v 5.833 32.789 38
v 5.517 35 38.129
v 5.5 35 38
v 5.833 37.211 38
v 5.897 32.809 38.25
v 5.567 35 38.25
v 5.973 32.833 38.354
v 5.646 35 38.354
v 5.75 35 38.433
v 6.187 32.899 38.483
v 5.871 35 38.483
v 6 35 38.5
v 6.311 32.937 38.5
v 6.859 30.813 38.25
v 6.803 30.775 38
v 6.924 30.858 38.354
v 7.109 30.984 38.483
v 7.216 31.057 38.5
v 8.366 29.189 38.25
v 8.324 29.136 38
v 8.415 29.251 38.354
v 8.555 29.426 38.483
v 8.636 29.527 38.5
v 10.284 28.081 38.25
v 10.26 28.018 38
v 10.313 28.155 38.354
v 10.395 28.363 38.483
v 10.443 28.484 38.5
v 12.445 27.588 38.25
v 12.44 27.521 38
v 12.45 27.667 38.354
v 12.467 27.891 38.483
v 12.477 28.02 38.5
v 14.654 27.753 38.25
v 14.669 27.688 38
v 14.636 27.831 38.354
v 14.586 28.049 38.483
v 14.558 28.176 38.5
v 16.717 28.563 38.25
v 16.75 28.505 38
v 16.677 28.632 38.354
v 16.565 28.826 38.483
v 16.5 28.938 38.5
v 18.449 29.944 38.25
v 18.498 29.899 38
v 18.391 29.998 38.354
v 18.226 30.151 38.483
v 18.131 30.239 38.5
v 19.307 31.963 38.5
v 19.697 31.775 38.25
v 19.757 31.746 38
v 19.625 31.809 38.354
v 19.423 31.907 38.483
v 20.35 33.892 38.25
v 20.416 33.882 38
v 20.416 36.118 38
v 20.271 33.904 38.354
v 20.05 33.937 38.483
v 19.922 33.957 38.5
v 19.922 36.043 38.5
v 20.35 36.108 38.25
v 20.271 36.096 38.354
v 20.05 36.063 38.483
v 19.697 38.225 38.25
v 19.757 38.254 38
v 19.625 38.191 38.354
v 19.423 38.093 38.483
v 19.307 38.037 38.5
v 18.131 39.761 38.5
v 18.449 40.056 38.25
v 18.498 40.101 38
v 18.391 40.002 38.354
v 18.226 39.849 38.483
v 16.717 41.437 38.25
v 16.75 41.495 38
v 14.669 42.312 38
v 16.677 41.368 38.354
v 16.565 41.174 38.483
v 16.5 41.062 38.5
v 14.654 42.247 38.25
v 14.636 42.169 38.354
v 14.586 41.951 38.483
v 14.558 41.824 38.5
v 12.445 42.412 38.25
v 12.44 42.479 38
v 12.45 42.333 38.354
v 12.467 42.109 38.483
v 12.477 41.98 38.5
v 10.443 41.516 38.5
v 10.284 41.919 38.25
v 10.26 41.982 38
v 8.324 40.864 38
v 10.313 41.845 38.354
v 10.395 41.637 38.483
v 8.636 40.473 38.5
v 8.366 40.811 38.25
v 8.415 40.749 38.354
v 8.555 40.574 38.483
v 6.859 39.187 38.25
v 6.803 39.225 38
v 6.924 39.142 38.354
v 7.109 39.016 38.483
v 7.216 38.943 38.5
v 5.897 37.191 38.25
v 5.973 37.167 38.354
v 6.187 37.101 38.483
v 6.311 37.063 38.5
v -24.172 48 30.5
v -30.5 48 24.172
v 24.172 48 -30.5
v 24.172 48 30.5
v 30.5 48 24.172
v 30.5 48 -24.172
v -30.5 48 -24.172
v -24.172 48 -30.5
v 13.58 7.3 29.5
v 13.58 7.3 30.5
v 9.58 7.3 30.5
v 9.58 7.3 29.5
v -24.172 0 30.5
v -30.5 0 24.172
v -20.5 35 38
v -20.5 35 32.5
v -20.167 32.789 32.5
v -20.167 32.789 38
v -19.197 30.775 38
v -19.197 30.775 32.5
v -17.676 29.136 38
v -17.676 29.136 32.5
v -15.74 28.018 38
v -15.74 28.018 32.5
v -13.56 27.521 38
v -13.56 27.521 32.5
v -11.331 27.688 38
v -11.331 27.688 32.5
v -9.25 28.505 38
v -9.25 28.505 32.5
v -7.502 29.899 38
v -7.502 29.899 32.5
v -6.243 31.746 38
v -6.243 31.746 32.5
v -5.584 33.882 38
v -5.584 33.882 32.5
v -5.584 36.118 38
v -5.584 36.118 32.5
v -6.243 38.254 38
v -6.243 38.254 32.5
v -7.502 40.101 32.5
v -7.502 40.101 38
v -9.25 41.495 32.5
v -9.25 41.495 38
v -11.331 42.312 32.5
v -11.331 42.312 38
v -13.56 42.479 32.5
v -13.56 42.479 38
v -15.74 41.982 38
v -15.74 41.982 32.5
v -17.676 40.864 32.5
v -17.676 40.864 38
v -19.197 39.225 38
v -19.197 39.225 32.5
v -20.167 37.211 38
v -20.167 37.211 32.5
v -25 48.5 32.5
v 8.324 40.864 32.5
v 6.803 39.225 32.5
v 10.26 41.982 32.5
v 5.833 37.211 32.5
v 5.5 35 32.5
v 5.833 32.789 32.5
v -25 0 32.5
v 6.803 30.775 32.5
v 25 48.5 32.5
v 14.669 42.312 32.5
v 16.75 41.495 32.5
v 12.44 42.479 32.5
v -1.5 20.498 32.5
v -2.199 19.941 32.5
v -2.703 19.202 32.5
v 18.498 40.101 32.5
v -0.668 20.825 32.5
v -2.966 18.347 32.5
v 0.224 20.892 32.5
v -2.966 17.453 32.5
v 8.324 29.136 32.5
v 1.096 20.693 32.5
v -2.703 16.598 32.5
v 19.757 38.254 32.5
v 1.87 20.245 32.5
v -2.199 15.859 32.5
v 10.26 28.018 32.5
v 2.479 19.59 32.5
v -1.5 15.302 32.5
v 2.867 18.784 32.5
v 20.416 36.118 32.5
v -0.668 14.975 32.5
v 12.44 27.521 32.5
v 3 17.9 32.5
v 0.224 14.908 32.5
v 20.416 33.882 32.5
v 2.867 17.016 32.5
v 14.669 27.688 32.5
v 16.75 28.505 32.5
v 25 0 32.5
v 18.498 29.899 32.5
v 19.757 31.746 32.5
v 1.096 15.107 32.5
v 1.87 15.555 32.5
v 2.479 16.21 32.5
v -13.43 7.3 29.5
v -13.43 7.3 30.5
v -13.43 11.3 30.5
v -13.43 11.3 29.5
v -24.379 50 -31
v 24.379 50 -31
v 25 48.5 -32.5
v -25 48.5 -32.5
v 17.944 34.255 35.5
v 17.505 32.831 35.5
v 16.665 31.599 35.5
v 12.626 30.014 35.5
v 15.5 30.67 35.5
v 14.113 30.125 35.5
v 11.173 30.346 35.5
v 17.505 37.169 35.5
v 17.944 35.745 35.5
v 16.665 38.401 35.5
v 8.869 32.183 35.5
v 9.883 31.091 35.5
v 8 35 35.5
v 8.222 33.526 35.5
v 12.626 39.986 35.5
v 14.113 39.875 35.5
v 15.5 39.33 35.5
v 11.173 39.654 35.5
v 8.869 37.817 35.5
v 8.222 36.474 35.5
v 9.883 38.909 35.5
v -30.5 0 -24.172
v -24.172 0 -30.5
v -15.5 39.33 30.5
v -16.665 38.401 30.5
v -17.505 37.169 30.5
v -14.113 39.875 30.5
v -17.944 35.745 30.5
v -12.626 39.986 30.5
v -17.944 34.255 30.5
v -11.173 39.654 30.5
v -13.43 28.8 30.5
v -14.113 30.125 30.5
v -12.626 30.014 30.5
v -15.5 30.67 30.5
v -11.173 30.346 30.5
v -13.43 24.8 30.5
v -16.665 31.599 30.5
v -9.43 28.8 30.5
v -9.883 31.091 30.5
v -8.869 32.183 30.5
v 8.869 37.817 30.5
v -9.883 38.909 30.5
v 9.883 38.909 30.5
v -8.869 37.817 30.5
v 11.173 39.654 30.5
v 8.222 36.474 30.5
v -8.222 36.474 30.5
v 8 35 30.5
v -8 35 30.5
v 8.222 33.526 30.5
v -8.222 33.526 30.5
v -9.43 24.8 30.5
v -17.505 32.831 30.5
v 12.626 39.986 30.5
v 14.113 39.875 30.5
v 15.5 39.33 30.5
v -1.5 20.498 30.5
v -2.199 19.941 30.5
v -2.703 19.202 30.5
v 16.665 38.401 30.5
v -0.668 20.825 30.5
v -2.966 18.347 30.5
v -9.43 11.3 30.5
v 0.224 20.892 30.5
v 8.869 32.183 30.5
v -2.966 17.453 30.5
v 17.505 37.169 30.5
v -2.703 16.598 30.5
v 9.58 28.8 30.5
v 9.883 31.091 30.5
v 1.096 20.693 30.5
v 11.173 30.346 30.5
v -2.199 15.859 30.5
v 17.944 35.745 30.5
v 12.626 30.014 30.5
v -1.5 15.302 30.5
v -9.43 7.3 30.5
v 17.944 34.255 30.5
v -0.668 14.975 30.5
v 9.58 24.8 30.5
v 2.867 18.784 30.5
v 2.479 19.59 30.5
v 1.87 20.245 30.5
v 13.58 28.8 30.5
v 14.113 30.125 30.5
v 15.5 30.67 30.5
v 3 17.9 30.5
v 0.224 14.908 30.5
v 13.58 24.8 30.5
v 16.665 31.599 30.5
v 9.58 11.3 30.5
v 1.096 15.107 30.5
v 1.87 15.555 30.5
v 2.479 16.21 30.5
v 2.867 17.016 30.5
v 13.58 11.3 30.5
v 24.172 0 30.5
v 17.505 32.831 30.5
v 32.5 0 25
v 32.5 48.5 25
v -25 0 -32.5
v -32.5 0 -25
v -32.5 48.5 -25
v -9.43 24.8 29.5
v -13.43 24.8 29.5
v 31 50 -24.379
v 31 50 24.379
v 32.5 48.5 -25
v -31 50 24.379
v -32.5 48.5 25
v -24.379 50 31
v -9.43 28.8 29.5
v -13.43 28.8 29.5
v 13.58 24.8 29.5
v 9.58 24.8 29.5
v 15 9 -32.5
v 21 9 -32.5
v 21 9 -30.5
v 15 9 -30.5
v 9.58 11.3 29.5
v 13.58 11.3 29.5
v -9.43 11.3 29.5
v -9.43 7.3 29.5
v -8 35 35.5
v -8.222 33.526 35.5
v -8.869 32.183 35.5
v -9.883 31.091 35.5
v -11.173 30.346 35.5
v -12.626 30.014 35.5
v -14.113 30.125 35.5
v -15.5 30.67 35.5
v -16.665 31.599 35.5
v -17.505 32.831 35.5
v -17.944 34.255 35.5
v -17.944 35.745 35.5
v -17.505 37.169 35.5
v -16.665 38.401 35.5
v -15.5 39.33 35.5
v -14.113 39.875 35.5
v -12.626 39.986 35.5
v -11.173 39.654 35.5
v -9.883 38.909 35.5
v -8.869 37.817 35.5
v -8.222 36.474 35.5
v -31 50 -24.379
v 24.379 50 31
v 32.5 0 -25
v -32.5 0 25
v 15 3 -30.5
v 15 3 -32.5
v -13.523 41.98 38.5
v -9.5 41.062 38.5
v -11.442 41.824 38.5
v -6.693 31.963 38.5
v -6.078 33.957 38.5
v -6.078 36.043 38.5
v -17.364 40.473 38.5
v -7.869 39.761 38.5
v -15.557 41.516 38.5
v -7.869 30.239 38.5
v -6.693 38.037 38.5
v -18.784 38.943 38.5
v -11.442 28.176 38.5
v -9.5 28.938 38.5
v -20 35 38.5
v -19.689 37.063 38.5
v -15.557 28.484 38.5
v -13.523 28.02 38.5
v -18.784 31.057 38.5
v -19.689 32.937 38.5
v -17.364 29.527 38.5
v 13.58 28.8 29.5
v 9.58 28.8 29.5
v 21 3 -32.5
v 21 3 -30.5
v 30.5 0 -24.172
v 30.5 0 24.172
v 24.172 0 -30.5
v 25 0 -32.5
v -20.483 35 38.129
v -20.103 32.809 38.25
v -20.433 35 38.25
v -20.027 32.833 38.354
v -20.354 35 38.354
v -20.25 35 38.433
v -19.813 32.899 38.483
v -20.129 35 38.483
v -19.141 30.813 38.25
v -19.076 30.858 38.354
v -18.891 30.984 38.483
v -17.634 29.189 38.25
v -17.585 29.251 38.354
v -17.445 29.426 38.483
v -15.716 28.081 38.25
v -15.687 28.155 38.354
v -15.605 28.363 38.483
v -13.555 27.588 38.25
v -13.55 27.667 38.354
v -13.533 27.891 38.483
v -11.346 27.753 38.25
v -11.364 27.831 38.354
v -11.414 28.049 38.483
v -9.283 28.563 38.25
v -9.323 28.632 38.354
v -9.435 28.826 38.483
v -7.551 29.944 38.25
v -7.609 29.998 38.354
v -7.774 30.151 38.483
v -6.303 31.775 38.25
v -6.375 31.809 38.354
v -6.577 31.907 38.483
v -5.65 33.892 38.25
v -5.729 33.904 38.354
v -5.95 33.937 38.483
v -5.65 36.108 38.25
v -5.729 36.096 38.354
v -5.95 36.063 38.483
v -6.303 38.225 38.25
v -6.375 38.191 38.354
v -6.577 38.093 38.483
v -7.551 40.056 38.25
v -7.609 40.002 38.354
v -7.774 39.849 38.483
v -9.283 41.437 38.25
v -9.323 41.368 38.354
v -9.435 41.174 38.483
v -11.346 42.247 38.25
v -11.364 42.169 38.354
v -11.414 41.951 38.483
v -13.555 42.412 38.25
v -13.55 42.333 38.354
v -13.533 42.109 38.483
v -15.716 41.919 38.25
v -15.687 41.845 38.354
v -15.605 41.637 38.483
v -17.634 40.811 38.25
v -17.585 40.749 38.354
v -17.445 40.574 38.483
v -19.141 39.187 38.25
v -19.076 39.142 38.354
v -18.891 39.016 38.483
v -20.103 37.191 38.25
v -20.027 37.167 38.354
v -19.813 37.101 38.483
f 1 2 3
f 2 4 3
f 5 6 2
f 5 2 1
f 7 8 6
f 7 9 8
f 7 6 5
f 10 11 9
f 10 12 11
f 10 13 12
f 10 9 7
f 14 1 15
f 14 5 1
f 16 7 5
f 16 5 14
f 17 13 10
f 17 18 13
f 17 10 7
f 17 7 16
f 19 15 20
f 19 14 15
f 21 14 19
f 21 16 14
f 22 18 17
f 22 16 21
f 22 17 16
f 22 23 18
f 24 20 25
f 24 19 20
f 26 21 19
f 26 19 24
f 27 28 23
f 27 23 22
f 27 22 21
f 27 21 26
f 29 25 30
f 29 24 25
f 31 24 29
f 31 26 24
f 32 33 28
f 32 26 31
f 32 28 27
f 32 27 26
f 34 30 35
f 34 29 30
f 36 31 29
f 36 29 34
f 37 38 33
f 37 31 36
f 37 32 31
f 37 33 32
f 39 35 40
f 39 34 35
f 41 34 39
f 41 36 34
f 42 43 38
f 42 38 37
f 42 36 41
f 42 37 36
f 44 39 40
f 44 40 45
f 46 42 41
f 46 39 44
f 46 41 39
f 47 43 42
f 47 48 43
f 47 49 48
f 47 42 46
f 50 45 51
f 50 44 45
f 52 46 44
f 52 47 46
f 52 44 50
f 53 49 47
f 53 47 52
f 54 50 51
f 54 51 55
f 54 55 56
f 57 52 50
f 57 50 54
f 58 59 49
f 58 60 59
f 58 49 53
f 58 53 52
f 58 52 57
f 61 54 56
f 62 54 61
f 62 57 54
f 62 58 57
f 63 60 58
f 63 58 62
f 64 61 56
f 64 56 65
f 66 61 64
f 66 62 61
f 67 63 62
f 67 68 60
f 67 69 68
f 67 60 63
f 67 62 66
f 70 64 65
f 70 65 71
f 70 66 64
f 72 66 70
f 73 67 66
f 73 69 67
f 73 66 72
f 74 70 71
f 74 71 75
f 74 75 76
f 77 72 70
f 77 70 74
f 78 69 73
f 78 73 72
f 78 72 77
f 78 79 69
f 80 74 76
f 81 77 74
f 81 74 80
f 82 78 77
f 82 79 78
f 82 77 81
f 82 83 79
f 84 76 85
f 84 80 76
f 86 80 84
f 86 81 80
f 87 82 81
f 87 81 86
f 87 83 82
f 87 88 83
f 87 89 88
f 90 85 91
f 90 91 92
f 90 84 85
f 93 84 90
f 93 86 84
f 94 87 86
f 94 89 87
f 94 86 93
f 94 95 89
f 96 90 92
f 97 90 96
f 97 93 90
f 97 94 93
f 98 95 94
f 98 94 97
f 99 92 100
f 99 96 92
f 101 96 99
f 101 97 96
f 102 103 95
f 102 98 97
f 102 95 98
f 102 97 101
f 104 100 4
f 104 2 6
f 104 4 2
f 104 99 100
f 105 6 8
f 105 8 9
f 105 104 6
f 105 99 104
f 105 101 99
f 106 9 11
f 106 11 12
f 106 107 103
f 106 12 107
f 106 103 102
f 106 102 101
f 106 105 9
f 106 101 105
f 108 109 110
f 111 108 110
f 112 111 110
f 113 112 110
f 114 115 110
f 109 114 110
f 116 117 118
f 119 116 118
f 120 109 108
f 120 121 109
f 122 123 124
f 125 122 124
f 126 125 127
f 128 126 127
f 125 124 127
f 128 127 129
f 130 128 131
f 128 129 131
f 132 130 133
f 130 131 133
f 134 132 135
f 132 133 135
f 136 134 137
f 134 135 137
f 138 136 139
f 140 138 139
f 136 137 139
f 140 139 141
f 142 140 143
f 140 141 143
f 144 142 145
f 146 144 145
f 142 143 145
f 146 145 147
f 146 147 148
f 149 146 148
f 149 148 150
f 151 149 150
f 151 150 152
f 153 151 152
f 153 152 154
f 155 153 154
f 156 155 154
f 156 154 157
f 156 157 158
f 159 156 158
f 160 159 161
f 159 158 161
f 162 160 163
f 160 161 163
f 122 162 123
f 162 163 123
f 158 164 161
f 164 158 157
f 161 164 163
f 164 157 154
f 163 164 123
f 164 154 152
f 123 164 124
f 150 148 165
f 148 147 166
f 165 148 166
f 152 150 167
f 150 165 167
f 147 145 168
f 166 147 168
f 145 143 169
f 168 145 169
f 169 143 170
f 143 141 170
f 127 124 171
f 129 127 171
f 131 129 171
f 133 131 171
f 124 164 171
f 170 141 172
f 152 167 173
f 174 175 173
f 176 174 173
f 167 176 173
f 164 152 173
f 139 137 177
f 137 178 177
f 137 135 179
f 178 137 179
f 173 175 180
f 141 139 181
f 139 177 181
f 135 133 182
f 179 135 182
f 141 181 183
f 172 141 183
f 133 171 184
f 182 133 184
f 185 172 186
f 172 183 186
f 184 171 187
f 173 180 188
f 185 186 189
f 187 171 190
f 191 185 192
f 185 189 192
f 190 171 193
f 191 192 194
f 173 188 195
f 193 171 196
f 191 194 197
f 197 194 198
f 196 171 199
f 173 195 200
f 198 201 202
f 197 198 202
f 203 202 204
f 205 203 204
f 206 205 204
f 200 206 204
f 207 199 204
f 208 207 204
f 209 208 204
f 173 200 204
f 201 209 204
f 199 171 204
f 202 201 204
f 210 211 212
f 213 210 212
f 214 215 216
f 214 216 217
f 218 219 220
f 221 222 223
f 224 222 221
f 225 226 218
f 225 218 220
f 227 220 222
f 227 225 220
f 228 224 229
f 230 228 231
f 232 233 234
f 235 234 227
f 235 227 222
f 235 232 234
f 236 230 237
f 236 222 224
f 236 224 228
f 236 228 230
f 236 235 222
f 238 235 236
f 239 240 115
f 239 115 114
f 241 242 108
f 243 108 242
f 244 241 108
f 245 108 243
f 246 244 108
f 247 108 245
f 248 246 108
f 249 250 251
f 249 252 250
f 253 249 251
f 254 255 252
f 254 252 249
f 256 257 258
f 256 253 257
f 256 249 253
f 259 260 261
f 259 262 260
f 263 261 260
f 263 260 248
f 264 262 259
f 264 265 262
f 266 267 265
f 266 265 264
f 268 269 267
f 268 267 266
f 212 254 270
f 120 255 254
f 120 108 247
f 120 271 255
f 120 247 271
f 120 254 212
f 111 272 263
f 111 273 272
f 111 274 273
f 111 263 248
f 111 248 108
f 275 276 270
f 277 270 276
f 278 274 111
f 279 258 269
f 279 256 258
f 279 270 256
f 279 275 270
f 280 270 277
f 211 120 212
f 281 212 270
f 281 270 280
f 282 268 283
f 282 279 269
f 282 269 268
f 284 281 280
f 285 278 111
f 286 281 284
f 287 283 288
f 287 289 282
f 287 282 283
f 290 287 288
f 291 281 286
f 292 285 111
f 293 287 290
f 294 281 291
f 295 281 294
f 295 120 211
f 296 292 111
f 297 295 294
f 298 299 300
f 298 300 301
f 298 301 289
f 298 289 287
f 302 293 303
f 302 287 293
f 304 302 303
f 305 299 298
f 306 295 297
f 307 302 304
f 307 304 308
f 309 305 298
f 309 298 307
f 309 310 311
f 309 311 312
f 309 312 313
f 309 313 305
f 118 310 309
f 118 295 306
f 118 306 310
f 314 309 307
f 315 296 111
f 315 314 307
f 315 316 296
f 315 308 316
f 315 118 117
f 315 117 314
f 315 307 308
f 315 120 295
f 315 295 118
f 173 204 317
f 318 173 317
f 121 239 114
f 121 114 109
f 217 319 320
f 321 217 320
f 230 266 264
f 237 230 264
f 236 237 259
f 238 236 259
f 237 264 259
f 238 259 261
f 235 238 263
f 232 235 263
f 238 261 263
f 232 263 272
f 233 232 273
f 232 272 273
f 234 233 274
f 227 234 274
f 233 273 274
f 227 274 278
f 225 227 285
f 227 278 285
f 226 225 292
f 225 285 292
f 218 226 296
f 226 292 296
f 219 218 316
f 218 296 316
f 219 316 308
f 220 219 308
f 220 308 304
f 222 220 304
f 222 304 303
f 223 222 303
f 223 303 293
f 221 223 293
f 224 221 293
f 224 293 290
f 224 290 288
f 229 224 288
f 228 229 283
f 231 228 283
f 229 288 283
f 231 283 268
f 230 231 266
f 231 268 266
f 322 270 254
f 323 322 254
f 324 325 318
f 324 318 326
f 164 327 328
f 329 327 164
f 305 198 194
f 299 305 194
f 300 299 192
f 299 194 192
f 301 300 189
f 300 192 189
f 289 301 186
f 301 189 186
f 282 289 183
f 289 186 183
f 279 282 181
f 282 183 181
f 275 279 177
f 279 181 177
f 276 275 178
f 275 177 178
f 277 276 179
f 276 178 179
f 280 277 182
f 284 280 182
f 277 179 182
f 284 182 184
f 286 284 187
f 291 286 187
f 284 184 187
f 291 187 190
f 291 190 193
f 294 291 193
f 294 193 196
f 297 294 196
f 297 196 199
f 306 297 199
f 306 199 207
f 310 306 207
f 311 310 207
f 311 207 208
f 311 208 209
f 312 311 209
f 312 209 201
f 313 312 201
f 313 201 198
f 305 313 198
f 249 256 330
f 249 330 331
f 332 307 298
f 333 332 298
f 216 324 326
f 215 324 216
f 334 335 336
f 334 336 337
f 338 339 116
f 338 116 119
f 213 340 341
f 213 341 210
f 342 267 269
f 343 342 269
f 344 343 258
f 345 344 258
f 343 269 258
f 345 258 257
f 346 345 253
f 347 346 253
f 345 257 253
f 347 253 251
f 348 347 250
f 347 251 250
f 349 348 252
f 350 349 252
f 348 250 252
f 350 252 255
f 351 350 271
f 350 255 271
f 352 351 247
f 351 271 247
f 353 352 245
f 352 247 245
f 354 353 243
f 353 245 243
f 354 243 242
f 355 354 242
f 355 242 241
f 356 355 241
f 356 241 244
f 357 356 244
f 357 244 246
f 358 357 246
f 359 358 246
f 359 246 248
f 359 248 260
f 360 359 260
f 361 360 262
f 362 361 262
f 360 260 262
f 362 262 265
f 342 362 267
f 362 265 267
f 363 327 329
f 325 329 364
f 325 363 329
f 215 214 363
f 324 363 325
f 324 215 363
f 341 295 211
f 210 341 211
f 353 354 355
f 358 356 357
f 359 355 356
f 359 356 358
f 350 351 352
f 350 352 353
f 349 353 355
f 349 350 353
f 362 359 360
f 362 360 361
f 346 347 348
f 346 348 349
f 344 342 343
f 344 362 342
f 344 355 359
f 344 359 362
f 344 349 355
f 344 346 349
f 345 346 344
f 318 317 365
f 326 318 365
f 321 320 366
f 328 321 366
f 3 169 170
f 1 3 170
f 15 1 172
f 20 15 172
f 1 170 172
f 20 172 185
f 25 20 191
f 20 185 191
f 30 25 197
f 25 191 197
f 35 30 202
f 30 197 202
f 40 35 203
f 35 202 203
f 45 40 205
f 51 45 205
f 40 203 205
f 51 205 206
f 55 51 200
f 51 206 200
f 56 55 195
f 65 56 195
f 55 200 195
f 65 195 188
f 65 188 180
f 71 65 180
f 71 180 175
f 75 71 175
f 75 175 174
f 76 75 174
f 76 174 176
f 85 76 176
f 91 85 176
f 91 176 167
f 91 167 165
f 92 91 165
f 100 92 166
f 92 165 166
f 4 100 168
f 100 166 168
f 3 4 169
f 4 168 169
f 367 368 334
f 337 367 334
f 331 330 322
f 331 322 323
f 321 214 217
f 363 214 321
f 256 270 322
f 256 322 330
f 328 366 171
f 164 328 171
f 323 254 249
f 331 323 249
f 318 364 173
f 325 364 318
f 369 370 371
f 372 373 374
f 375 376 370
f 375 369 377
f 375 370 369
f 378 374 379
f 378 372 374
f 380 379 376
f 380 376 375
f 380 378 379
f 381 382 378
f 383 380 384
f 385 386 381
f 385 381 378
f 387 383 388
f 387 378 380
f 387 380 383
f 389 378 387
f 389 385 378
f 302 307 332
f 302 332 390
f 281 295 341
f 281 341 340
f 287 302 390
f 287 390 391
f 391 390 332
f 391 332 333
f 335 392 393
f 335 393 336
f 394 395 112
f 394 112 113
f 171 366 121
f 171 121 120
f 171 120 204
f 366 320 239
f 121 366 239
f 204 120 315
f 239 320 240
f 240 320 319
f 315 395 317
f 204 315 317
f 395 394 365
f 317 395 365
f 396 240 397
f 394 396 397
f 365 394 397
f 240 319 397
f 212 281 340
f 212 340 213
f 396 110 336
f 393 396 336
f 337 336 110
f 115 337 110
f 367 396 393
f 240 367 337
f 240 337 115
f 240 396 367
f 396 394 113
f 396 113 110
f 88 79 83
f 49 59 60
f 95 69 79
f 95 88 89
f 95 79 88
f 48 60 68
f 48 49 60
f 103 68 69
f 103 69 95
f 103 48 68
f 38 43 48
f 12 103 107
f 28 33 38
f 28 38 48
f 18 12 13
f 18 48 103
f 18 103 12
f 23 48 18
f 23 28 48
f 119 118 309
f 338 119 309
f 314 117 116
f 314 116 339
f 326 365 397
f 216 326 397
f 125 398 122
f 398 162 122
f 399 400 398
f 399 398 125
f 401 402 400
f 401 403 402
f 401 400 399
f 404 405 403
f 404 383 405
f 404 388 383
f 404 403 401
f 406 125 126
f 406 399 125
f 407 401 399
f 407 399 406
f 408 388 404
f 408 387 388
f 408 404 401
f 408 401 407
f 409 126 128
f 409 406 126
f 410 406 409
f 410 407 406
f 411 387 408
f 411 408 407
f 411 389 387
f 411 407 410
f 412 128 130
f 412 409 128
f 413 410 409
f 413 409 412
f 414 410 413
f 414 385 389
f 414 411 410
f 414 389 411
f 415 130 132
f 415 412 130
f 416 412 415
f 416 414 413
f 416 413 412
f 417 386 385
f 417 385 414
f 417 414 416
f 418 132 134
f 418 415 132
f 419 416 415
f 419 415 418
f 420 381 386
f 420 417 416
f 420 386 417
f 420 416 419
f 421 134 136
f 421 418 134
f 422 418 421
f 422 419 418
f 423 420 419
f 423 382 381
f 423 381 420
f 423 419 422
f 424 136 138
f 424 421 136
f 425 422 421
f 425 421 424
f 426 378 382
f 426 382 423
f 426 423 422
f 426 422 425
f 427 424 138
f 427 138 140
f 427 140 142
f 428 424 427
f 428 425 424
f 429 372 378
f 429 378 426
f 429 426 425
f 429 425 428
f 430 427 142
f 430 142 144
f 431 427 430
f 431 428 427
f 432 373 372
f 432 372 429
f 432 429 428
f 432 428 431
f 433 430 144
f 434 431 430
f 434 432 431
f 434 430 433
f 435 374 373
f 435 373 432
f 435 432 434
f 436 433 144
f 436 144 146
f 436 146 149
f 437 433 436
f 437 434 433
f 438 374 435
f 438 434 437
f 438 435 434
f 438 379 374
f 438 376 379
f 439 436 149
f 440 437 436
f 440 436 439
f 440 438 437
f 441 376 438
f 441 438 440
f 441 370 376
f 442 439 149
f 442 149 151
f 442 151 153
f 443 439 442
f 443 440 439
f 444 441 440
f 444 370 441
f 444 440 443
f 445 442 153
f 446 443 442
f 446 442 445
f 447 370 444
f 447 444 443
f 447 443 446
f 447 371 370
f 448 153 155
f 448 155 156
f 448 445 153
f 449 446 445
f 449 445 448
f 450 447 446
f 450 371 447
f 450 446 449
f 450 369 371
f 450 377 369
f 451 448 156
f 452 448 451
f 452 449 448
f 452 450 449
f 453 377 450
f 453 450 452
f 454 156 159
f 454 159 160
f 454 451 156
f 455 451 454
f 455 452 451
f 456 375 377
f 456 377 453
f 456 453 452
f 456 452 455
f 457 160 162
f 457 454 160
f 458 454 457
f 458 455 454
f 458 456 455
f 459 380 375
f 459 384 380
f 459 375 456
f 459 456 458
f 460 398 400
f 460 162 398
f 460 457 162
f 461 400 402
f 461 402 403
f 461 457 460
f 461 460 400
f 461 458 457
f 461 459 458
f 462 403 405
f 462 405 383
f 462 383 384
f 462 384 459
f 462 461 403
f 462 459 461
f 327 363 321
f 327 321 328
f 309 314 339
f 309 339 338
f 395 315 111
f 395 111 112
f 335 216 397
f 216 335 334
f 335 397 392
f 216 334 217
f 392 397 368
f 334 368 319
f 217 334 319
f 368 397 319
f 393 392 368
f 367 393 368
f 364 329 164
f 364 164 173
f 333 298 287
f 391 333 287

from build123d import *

# Parameters (mm, degrees)
SALIENTE_EXTRUIR1_DEPTH = 50
VACIADO2_T              = -2
CHAFL_N3_SIZE           = 1.5
CROQUIS2_R              = 7.5
SALIENTE_EXTRUIR2_DEPTH = 6
CROQUIS4_R              = 5
CORTAR_EXTRUIR2_DEPTH   = 5
REDONDEO1_R             = 0.5
CROQUIS5_R              = 3
CORTAR_EXTRUIR3_DEPTH   = 10
CROQUIS6_W              = 6
CROQUIS6_H              = 6
CORTAR_EXTRUIR4_DEPTH   = 10
CROQUIS7_W              = 4
CROQUIS7_H              = 4
SALIENTE_EXTRUIR3_DEPTH = 1


with BuildPart() as part:
    # Croquis1 → Saliente-Extruir1 (new body)
    with BuildSketch(Plane(origin=(0, 0, 0), x_dir=(1, 0, 0), z_dir=(0, 1, 0))):
        Polygon((-25, -32.5), (25, -32.5), (32.5, -25), (32.5, 25), (25, 32.5), (-25, 32.5), (-32.5, 25), (-32.5, -25), align=None)
    extrude(amount=SALIENTE_EXTRUIR1_DEPTH)

    # Vaciado2
    vaciado2_openings = [part.faces().sort_by_distance(p)[0] for p in [
        (0, 0, 0),
    ]]
    offset(amount=VACIADO2_T, openings=vaciado2_openings, kind=Kind.INTERSECTION)

    # Chaflán3
    chafl_n3_edges = [part.edges().sort_by_distance(p)[0] for p in [
        (-28.75, 50, -28.75),
        (-32.5, 50, 0),
        (-28.75, 50, 28.75),
        (0, 50, 32.5),
        (28.75, 50, 28.75),
        (32.5, 50, 0),
        (28.75, 50, -28.75),
        (0, 50, -32.5),
    ]]
    chamfer(chafl_n3_edges, length=CHAFL_N3_SIZE)

    # Croquis2 → Saliente-Extruir2 (add)
    with BuildSketch(Plane.XY.offset(32.5)):
        with Locations(Location((13, 35, 0), (0, 0, 180))):
            Circle(CROQUIS2_R)
        with Locations(Location((-13, 35, 0), (0, 0, 180))):
            Circle(CROQUIS2_R)
    extrude(amount=SALIENTE_EXTRUIR2_DEPTH)

    # Croquis4 → Cortar-Extruir2 (cut)
    with BuildSketch(Plane(origin=(0, 0, 30.5), x_dir=(-1, 0, 0), z_dir=(0, 0, -1))):
        with Locations((-13, 35)):
            Circle(CROQUIS4_R)
        with Locations(Location((13, 35, 0), (0, 0, 180))):
            Circle(CROQUIS4_R)
    extrude(amount=-CORTAR_EXTRUIR2_DEPTH, mode=Mode.SUBTRACT)

    # Redondeo1
    redondeo1_edges = [part.edges().sort_by_distance(p)[0] for p in [
        (20.5, 35, 38.5),
        (-5.5, 35, 38.5),
    ]]
    fillet(redondeo1_edges, radius=REDONDEO1_R)

    # Croquis5 → Cortar-Extruir3 (cut)
    with BuildSketch(Plane.XY.offset(32.5)):
        with Locations((0, 17.9)):
            Circle(CROQUIS5_R)
    extrude(amount=-CORTAR_EXTRUIR3_DEPTH, mode=Mode.SUBTRACT)

    # Croquis6 → Cortar-Extruir4 (cut)
    with BuildSketch(Plane(origin=(0, 0, -32.5), x_dir=(-1, 0, 0), z_dir=(0, 0, -1))):
        with Locations((-18, 6)):
            Rectangle(CROQUIS6_W, CROQUIS6_H)
    extrude(amount=-CORTAR_EXTRUIR4_DEPTH, mode=Mode.SUBTRACT)

    # Croquis7 → Saliente-Extruir3 (add)
    with BuildSketch(Plane(origin=(0, 0, 30.5), x_dir=(-1, 0, 0), z_dir=(0, 0, -1))):
        with Locations((-11.58, 9.3)):
            Rectangle(CROQUIS7_W, CROQUIS7_H)
        with Locations((-11.58, 26.8)):
            Rectangle(CROQUIS7_W, CROQUIS7_H)
        with Locations((11.43, 9.3)):
            Rectangle(CROQUIS7_W, CROQUIS7_H)
        with Locations((11.43, 26.8)):
            Rectangle(CROQUIS7_W, CROQUIS7_H)
    extrude(amount=SALIENTE_EXTRUIR3_DEPTH)


solid = part.part
